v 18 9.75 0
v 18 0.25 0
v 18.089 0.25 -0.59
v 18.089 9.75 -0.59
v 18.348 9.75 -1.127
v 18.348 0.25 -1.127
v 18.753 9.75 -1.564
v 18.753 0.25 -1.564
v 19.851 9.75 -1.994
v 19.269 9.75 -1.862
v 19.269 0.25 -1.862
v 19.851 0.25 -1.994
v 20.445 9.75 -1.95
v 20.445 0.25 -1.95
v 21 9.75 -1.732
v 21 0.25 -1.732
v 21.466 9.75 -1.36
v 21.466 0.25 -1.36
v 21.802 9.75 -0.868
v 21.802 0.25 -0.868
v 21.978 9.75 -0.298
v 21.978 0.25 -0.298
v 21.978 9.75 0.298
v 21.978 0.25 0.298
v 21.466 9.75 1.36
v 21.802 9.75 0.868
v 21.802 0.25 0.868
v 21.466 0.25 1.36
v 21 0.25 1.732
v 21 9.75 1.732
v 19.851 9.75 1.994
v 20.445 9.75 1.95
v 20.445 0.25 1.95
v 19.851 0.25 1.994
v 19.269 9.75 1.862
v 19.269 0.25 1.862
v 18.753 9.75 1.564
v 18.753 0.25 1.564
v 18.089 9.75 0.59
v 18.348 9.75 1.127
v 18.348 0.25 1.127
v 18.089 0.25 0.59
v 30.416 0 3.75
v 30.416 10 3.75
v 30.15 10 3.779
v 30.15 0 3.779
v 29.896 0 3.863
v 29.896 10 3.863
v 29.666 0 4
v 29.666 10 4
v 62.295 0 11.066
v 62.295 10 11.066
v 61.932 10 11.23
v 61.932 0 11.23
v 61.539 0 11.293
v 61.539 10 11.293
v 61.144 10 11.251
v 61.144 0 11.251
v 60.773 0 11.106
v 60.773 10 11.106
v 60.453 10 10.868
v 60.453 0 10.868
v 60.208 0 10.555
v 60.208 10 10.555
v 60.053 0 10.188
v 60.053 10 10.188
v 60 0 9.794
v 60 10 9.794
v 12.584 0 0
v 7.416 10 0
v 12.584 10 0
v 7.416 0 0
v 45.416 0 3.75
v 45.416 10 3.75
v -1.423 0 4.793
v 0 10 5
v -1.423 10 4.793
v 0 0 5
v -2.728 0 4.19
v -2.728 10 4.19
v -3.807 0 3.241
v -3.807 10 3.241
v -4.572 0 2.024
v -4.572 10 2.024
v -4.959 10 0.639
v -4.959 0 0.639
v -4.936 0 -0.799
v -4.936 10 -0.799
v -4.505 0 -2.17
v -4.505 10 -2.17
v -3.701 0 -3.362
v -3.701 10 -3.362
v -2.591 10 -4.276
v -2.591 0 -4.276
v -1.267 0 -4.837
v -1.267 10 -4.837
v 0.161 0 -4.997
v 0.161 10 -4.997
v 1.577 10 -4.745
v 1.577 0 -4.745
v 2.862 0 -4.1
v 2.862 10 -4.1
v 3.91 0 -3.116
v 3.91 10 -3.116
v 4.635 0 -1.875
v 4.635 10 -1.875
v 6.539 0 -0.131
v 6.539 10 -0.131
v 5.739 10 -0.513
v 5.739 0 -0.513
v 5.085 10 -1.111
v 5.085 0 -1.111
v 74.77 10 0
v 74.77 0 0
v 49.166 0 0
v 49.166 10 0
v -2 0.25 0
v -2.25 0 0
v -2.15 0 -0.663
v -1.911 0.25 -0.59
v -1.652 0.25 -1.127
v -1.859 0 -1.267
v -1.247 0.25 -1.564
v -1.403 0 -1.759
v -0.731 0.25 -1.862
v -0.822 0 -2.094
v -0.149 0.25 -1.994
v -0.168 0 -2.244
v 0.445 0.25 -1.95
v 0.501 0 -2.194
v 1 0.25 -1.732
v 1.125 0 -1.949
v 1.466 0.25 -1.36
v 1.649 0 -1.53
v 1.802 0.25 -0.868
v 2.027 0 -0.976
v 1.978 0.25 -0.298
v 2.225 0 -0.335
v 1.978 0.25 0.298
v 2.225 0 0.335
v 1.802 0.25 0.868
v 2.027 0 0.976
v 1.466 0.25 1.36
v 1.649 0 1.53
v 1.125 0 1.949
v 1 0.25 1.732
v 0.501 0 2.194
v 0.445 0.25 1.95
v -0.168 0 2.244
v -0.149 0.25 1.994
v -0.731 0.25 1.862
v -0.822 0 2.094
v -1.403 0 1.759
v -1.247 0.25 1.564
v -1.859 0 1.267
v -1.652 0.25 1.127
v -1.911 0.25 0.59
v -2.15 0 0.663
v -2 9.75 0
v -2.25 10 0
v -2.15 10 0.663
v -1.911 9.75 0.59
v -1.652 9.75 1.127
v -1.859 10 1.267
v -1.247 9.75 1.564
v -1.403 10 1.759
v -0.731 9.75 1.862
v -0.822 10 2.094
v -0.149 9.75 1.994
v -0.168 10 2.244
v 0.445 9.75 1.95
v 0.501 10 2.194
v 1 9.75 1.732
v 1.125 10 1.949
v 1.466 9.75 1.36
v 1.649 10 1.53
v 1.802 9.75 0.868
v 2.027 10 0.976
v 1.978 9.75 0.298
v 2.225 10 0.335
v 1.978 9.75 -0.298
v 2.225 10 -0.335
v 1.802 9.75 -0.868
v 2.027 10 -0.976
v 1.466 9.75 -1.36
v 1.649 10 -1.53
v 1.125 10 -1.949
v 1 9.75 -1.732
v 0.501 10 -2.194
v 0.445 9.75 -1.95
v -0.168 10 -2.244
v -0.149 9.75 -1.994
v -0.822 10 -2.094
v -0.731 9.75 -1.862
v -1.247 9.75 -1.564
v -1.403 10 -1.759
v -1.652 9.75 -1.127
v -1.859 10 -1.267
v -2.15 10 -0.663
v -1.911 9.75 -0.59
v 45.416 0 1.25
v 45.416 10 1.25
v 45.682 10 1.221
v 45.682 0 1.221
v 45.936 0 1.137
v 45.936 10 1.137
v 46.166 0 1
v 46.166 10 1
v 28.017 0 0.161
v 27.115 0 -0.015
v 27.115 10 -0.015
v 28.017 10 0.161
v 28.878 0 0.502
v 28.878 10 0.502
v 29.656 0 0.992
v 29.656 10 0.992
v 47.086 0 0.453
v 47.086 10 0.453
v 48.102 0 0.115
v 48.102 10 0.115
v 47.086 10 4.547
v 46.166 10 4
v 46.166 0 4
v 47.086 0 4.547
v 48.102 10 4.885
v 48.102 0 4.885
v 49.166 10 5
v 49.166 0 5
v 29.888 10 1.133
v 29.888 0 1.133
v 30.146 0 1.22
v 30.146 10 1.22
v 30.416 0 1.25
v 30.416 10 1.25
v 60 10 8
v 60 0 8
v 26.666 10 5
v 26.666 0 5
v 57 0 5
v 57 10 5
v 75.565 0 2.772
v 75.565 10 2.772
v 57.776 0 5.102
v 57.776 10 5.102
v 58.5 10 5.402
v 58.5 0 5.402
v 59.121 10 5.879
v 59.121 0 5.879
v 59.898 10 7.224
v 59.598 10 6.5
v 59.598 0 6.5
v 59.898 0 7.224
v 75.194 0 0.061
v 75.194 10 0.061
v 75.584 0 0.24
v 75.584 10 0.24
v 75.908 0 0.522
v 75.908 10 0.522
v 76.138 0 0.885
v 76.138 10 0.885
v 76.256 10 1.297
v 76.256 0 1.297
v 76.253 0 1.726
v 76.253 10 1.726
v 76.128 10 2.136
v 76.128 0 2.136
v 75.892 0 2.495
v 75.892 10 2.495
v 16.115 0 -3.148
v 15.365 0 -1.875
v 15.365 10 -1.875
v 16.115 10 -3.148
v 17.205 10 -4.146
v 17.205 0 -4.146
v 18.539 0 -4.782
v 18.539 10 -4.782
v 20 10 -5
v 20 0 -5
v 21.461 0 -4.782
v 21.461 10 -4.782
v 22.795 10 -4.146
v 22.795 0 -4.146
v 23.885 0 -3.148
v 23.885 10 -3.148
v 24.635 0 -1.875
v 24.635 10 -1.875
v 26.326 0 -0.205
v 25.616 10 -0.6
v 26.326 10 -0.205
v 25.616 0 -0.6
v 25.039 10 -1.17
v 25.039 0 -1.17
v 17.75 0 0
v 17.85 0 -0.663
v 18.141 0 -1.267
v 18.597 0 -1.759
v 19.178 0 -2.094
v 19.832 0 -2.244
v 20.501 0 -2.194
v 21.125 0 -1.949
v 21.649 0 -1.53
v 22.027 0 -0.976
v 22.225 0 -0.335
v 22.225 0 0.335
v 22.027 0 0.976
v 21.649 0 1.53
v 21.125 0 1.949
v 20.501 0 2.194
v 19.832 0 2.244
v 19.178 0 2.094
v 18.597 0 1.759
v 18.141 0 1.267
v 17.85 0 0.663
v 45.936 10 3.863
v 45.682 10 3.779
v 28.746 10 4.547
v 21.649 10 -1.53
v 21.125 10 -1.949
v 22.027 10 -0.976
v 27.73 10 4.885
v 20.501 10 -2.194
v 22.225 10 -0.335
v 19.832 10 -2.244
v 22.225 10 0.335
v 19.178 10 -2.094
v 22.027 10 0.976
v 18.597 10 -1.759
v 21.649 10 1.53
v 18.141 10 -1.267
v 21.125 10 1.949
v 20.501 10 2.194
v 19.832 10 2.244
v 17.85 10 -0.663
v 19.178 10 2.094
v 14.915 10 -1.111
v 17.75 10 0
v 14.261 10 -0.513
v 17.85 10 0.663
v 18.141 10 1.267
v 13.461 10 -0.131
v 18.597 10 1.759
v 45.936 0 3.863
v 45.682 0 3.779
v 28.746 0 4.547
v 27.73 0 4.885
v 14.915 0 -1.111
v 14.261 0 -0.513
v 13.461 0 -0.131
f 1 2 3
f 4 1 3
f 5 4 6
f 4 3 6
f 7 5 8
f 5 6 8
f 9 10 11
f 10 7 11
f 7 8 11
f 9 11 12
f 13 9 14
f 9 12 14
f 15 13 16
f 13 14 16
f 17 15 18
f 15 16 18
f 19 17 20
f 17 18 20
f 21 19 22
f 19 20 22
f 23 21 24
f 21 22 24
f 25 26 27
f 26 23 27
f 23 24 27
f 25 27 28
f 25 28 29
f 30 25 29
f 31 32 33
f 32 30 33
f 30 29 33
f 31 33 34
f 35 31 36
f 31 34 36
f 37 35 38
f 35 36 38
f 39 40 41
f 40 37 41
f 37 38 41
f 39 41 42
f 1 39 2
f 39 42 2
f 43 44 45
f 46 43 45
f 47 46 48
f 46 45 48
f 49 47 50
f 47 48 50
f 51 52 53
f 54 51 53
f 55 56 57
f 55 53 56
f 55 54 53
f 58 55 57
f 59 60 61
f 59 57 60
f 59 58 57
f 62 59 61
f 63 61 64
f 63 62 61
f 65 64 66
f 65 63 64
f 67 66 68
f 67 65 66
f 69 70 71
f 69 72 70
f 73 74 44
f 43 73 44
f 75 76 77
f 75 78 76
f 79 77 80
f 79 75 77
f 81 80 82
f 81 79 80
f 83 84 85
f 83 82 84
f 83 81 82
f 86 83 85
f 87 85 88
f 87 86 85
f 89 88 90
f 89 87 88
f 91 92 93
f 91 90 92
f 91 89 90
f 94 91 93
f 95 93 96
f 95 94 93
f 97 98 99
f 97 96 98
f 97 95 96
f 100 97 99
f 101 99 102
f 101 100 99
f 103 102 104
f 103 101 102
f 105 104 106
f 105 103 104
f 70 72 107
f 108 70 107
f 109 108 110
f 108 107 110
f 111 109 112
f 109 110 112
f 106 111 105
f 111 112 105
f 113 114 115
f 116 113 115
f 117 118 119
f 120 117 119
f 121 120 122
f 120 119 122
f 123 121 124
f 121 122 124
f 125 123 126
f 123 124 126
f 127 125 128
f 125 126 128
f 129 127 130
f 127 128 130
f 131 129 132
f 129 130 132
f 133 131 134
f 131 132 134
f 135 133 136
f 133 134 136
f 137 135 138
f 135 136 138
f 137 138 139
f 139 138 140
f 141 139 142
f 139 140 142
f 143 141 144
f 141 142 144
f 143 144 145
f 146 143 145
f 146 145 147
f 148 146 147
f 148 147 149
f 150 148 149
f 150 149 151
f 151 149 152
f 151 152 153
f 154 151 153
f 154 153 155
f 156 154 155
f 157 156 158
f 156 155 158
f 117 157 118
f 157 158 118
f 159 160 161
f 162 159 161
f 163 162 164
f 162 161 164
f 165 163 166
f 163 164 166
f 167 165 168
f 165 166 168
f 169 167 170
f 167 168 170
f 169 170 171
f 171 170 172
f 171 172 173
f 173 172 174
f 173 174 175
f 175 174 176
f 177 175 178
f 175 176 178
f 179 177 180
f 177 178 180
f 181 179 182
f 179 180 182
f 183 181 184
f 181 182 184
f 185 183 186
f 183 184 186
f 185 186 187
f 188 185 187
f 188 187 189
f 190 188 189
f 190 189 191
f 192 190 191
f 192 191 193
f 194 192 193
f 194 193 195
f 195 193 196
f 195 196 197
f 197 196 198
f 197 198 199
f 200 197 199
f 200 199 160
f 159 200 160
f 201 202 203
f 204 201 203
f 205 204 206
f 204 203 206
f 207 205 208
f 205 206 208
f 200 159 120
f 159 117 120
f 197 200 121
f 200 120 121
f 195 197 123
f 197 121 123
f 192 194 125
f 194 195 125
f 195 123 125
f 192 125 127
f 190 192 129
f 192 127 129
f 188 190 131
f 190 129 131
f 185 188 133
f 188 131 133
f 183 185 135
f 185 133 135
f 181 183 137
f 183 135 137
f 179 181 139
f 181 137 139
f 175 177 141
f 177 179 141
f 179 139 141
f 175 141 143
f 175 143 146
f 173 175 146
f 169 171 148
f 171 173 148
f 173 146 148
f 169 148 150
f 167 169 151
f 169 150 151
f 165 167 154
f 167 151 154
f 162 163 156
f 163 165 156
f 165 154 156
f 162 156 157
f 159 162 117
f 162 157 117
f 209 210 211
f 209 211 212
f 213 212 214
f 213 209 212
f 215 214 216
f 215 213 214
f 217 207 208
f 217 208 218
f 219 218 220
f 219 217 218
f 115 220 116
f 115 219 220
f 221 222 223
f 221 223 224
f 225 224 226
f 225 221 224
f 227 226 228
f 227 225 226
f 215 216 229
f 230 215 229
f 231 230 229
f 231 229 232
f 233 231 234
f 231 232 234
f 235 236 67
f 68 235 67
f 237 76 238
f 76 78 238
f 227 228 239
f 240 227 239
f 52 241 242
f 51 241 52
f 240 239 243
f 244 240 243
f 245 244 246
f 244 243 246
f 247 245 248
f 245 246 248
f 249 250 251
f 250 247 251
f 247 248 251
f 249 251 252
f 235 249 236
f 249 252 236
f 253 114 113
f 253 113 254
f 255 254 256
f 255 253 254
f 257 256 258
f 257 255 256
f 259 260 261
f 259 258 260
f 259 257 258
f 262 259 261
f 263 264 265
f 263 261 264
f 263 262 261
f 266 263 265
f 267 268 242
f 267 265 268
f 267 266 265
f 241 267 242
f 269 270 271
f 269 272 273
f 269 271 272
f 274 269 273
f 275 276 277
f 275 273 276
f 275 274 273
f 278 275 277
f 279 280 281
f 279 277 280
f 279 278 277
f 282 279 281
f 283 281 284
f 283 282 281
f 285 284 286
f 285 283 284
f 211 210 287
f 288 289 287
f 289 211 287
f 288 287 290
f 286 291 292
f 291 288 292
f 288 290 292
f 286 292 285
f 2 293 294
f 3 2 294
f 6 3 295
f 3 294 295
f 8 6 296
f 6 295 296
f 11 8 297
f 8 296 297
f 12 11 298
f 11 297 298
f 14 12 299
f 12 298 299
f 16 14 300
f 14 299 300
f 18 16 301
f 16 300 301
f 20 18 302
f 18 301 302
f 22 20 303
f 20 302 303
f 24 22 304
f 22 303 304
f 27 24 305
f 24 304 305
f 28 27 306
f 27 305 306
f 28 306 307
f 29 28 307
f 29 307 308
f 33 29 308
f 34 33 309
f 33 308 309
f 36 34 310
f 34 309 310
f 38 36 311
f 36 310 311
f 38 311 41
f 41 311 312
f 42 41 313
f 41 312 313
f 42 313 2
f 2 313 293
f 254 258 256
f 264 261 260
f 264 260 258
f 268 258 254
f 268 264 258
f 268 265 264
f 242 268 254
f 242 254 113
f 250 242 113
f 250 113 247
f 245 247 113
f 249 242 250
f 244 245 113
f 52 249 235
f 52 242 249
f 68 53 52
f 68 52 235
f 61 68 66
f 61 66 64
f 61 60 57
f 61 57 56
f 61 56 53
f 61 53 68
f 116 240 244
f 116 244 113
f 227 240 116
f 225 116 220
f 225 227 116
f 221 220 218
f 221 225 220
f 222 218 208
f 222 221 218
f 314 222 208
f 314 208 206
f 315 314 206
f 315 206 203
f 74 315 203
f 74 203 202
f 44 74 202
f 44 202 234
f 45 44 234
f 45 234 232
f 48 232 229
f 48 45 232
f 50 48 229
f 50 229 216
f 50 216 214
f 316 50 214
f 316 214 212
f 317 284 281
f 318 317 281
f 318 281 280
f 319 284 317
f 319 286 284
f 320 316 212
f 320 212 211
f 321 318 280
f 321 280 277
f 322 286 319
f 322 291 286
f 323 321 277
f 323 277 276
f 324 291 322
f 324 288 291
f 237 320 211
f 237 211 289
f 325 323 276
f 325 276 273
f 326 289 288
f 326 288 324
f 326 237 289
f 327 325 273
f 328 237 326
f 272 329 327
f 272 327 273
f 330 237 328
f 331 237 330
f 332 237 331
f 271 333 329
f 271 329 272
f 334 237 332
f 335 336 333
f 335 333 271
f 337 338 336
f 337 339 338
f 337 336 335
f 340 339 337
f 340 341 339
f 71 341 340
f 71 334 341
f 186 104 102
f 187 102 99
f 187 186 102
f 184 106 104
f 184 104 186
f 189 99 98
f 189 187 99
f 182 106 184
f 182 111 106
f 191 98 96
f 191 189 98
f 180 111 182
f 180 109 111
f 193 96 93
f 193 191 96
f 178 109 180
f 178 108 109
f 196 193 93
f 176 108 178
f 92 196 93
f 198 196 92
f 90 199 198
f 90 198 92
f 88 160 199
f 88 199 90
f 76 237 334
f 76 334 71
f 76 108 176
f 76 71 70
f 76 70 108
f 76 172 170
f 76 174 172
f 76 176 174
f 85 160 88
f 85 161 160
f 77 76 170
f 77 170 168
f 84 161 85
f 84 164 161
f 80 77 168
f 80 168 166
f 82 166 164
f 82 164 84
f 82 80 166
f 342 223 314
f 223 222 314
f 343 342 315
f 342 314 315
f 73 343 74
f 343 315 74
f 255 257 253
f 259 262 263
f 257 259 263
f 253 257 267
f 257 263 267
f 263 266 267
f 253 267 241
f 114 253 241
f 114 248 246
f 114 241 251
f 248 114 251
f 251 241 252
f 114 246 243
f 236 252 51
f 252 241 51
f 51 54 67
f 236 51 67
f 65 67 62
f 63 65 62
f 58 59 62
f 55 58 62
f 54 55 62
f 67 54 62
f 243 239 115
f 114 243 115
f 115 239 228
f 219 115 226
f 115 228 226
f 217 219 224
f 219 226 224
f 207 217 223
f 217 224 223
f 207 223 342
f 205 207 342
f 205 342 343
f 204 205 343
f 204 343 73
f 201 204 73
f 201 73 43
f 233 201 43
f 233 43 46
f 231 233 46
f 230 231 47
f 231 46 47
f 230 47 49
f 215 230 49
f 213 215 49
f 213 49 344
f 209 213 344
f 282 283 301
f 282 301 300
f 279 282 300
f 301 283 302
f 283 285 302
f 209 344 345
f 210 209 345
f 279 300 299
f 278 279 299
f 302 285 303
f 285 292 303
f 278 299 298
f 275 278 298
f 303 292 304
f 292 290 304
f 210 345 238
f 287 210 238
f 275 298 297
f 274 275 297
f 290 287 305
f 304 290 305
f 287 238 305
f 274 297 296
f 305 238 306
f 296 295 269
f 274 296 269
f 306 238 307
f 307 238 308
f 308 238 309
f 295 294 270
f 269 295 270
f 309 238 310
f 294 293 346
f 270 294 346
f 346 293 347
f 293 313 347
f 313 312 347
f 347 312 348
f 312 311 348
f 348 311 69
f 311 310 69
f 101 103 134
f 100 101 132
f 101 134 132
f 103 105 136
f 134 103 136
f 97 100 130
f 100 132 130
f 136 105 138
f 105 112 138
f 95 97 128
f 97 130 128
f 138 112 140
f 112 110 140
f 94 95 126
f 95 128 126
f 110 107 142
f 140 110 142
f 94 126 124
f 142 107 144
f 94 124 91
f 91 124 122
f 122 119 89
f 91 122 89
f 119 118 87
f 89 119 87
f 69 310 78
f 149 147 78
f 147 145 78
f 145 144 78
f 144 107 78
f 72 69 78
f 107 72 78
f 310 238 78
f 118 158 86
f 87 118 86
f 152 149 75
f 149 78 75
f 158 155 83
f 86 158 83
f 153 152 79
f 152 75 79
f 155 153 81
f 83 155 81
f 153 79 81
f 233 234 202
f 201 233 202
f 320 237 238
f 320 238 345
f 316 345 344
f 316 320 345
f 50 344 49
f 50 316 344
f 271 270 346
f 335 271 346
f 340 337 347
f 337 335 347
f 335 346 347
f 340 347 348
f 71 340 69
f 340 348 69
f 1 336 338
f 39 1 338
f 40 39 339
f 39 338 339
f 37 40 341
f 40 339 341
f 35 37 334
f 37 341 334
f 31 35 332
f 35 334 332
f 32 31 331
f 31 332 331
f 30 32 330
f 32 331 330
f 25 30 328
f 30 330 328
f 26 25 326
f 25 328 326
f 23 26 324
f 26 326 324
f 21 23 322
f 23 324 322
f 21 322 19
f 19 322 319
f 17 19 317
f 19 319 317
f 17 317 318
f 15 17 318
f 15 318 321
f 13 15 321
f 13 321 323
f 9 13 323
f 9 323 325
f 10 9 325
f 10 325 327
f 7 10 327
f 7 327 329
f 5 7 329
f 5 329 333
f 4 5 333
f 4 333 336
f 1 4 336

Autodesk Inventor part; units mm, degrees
ref_plane "YZ Plane" through (0, 0, 0) normal (1, 0, 0) x (0, 1, 0)
ref_plane "XZ Plane" through (0, 0, 0) normal (0, 1, 0) x (-1, 0, 0)
ref_plane "XY Plane" through (0, 0, 0) normal (0, 0, 1) x (1, 0, 0)
sketch "Sketch1" plane through (0, 0, 0) normal (0, 1, 0) x (-1, 0, 0)
  circle A0 centre (0, 0) radius 2
  line L0 (-7.4162, 0) -> (-12.5838, 0) construction
  circle A1 centre (-20, 0) radius 2
  arc A2 (-4.6351, -1.875) -> (0, 5) centre (0, 0) ccw
  arc A3 (-24.6351, -1.875) -> (-15.3649, -1.875) centre (-20, 0) ccw
  line L1 (-5, 0) -> (-15, 0)
  arc A4 (-4.6351, -1.875) -> (-7.4162, 0) centre (-7.4162, -3) ccw
  arc A5 (-12.5838, 0) -> (-15.3649, -1.875) centre (-12.5838, -3) ccw
  line L2 (-27.4162, 0) -> (-74.7698, 0) construction
  line L3 (-80, 0) -> (-80, 12.5) construction
  line L4 (-80, 12.5) -> (-60, 12.5) construction
  line L5 (-75.5648, 2.772) -> (-62.295, 11.0656)
  line L6 (-80, 0) -> (-25, 0)
  line L7 (0, 5) -> (-57, 5)
  line L8 (-60, 8) -> (-60, 9.7936)
  arc A6 (-60, 8) -> (-57, 5) centre (-57, 8) ccw
  arc A7 (-60, 9.7936) -> (-62.295, 11.0656) centre (-61.5, 9.7936) ccw
  arc A8 (-75.5648, 2.772) -> (-74.7698, 0) centre (-74.7698, 1.5) ccw
  arc A9 (-24.6351, -1.875) -> (-27.4162, 0) centre (-27.4162, -3) ccw
  point P0 (-60, 5)
  point P1 (0, 5)
  point P2 (-74.7698, 0)
  point P3 (-7.4162, 0)
  point P4 (-27.4162, 0)
  dimension "d0" = 4
  dimension "d4" = 4
  dimension "d5" = 10
  dimension "d6" = 10
  dimension "d7" = 3
  dimension "d8" = 80
  dimension "d9" = 12.5
  dimension "d10" = 20
  dimension "d11" = 60
  dimension "d12" = 3
  dimension "d13" = 1.5
  dimension "d19" = 5
  dimension "d20" = 3
extrude "Extrusion1" add sketch "Sketch1" along normal blind 10
chamfer "Chamfer1" distance 0.25 angle 45 4 edges at (22, 10, 0) (2, 10, 0) (22, 0, 0) (2, 0, 0)
sketch "Sketch2" plane through (0, 10, 0) normal (0, 1, 0) x (1, 0, 0)
  circle A0 centre (20, 0) radius 2.25 projected
  arc A1 (75.5648, -2.772) -> (74.7698, 0) centre (74.7698, -1.5) ccw projected
  line L0 (74.7698, 0) -> (27.4162, 0) projected
  arc A2 (24.6351, 1.875) -> (27.4162, 0) centre (27.4162, 3) ccw projected
  arc A3 (24.6351, 1.875) -> (15.3649, 1.875) centre (20, 0) ccw projected
  arc A4 (12.5838, 0) -> (15.3649, 1.875) centre (12.5838, 3) ccw projected
  line L1 (12.5838, 0) -> (7.4162, 0) projected
  arc A5 (4.6351, 1.875) -> (7.4162, 0) centre (7.4162, 3) ccw projected
  arc A6 (4.6351, 1.875) -> (0, -5) centre (0, 0) ccw projected
  line L2 (0, -5) -> (57, -5) projected
  arc A7 (60, -8) -> (57, -5) centre (57, -8) ccw projected
  line L3 (60, -8) -> (60, -9.7936) projected
  arc A8 (60, -9.7936) -> (62.295, -11.0656) centre (61.5, -9.7936) ccw projected
  line L4 (62.295, -11.0656) -> (75.5648, -2.772) projected
  circle A9 centre (0, 0) radius 2.25 projected
sketch "Sketch3" plane through (0, 10, 0) normal (0, 1, 0) x (1, 0, 0)
  line L0 (27.4162, 0) -> (27.4162, -5) construction
  line L1 (0, -5) -> (57, -5) construction
  line L2 (27.4162, 0) -> (30.4162, 0) construction
  line L3 (30.4162, 0) -> (30.4162, -5) construction
  line L4 (30.4162, -5) -> (27.4162, -5) construction
  line L5 (27.4162, -5) -> (27.4162, 0) construction
  line L6 (30.4162, 0) -> (45.4162, 0) construction
  line L7 (74.7698, 0) -> (27.4162, 0) projected
  line L8 (30.4162, -1.25) -> (45.4162, -1.25)
  line L9 (45.4162, 1.25) -> (30.4162, 1.25)
  arc A0 (30.4162, 1.25) -> (30.4162, -1.25) centre (30.4162, 0) ccw
  arc A1 (45.4162, -1.25) -> (45.4162, 1.25) centre (45.4162, 0) ccw
  line L10 (30.4162, -5) -> (45.4162, -5) construction
  line L11 (30.4162, -6.25) -> (45.4162, -6.25)
  line L12 (45.4162, -3.75) -> (30.4162, -3.75)
  arc A2 (30.4162, -3.75) -> (30.4162, -6.25) centre (30.4162, -5) ccw
  arc A3 (45.4162, -6.25) -> (45.4162, -3.75) centre (45.4162, -5) ccw
  point P0 (0, 0)
  point P1 (37.9162, 0)
  point P2 (37.9162, -5)
  point P3 (46.6662, 0)
  point P4 (29.1662, 0)
  dimension "d21" = 3
  dimension "d22" = 5
  dimension "d28" = 15
  dimension "d29" = 2.5
  dimension "d30" = 15
  dimension "d31" = 2.5
extrude "Extrusion2" cut sketch "Sketch3" against normal through all contours A1 L8 A0 L7 | A2 L12 A3 L11
fillet "Fillet2" radius 5 4 edges at (29.1662, 5, 0) (46.6662, 5, 0) (46.6662, 5, 5) (29.1662, 5, 5)
properties part number "Battery_Clip" material "Nylon 6/6"
